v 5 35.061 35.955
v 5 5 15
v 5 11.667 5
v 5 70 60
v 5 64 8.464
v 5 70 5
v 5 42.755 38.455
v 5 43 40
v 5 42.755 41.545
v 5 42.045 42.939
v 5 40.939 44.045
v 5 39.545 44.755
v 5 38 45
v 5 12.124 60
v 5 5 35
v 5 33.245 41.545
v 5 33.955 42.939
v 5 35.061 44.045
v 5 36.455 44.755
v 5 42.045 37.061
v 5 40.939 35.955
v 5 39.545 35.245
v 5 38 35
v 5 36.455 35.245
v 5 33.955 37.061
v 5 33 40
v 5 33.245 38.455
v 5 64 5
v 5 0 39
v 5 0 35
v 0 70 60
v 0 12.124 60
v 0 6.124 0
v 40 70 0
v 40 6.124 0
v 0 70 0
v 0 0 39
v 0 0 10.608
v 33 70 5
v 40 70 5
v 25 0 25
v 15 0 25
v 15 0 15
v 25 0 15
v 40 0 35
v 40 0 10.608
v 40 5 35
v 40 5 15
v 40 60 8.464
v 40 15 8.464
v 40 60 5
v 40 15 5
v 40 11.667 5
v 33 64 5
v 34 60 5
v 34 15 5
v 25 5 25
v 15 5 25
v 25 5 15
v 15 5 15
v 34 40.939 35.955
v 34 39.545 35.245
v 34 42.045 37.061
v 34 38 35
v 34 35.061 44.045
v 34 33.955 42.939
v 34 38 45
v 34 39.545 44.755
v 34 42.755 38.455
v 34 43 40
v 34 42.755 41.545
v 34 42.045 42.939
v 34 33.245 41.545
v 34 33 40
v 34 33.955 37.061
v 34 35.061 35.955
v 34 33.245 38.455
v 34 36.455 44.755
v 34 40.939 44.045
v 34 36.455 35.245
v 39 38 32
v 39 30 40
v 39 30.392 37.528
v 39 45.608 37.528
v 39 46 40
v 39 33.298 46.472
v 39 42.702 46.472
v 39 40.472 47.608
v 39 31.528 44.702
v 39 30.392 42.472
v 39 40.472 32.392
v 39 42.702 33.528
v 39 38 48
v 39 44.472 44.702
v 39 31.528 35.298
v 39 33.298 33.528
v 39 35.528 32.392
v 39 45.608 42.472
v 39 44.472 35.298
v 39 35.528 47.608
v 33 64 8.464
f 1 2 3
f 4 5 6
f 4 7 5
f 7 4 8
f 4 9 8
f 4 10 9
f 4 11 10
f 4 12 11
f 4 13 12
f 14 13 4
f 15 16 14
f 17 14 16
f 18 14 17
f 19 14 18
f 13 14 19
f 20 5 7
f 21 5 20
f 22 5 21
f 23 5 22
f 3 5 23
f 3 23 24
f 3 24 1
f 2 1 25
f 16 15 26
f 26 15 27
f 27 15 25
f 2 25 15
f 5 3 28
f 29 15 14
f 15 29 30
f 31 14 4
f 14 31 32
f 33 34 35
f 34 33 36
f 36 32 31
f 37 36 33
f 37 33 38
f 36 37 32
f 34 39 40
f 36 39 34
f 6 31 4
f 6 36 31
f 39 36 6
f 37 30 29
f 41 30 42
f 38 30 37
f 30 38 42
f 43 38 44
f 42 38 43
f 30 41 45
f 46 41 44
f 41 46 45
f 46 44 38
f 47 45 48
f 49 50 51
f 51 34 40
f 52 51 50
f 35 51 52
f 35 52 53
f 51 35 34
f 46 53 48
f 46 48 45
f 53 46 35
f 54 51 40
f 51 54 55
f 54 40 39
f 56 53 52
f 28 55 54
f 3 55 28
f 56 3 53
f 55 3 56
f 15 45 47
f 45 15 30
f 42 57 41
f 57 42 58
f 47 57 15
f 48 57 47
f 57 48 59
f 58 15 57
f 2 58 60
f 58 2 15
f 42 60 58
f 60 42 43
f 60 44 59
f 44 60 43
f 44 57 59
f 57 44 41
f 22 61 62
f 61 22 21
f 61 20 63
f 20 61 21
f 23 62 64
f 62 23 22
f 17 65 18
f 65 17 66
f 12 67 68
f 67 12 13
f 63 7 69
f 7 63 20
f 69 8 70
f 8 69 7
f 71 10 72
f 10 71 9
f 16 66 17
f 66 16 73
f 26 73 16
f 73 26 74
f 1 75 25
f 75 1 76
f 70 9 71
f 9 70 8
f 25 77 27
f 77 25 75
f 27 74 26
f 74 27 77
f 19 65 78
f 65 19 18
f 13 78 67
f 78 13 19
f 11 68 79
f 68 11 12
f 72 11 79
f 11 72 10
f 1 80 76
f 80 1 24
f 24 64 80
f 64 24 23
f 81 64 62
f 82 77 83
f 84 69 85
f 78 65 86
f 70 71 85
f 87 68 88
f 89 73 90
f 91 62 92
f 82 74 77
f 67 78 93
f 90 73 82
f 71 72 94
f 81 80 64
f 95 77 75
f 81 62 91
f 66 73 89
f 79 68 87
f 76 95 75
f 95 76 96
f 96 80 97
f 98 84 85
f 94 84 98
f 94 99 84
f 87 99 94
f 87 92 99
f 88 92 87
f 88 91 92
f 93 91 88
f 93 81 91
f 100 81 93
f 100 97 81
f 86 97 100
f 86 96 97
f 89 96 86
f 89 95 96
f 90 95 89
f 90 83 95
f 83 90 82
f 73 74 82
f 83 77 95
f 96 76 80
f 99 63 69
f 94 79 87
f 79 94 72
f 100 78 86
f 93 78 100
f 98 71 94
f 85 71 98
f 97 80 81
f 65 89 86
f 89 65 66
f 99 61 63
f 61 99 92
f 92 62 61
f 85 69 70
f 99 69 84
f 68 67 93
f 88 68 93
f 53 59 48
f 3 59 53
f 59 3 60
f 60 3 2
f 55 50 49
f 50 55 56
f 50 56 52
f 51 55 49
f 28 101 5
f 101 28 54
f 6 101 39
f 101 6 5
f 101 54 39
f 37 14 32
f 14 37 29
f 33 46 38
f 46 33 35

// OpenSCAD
difference() {
    union() {
        // ベース部分
        union() {
            cube([5, 70, 60]);
            cube([40, 70, 5]);
            translate([0, 0, 25]) cube([40, 5, 10]);
            translate([0, 0, 15]) cube([15, 5, 10]);
            translate([25, 0, 15]) cube([15, 5, 10]);
        }
        // 左下台形
        translate([40, 0, 0]) {
            rotate([0, 270, 0]) {
                linear_extrude(height = 40) {
                    polygon([[0,0],[0, 15],[15, 5], [15, 0]]);
                }
            }
        }
        // 柱
        translate([0, 38, 40]) {
            union() {
                rotate([0, 90, 0]) {
                    cylinder(h=35, r=5, $fn=20);
                }
                translate([34, 0, 0]) {
                    rotate([0, 90, 0]) {
                        cylinder(h=5, r1=5, r2=8, $fn=20);
                    }
                }
            }
        }
        // 横の壁
        translate([38, 60, 5]) rotate([0, 60, 0]) rotate([90, 0, 0]) cylinder(h=45, r=4, $fn=3);
        // 後方の段差
        translate([3, 66, 5]) rotate([90, 0, 0]) rotate([0, 90, 0]) cylinder(h=30, r=4, $fn=3);
    }
    // 左上三角
    translate([0, 0, 60]) {
        rotate([0, 90, 0]) {
            cylinder(h=30, r=21, $fn=3);
        }
    }
    translate([0, -6, 0]) {
        rotate([0, 90, 0]) rotate([0, 0, 180]) cylinder(h=40, r=21, $fn=3);
    }
}
